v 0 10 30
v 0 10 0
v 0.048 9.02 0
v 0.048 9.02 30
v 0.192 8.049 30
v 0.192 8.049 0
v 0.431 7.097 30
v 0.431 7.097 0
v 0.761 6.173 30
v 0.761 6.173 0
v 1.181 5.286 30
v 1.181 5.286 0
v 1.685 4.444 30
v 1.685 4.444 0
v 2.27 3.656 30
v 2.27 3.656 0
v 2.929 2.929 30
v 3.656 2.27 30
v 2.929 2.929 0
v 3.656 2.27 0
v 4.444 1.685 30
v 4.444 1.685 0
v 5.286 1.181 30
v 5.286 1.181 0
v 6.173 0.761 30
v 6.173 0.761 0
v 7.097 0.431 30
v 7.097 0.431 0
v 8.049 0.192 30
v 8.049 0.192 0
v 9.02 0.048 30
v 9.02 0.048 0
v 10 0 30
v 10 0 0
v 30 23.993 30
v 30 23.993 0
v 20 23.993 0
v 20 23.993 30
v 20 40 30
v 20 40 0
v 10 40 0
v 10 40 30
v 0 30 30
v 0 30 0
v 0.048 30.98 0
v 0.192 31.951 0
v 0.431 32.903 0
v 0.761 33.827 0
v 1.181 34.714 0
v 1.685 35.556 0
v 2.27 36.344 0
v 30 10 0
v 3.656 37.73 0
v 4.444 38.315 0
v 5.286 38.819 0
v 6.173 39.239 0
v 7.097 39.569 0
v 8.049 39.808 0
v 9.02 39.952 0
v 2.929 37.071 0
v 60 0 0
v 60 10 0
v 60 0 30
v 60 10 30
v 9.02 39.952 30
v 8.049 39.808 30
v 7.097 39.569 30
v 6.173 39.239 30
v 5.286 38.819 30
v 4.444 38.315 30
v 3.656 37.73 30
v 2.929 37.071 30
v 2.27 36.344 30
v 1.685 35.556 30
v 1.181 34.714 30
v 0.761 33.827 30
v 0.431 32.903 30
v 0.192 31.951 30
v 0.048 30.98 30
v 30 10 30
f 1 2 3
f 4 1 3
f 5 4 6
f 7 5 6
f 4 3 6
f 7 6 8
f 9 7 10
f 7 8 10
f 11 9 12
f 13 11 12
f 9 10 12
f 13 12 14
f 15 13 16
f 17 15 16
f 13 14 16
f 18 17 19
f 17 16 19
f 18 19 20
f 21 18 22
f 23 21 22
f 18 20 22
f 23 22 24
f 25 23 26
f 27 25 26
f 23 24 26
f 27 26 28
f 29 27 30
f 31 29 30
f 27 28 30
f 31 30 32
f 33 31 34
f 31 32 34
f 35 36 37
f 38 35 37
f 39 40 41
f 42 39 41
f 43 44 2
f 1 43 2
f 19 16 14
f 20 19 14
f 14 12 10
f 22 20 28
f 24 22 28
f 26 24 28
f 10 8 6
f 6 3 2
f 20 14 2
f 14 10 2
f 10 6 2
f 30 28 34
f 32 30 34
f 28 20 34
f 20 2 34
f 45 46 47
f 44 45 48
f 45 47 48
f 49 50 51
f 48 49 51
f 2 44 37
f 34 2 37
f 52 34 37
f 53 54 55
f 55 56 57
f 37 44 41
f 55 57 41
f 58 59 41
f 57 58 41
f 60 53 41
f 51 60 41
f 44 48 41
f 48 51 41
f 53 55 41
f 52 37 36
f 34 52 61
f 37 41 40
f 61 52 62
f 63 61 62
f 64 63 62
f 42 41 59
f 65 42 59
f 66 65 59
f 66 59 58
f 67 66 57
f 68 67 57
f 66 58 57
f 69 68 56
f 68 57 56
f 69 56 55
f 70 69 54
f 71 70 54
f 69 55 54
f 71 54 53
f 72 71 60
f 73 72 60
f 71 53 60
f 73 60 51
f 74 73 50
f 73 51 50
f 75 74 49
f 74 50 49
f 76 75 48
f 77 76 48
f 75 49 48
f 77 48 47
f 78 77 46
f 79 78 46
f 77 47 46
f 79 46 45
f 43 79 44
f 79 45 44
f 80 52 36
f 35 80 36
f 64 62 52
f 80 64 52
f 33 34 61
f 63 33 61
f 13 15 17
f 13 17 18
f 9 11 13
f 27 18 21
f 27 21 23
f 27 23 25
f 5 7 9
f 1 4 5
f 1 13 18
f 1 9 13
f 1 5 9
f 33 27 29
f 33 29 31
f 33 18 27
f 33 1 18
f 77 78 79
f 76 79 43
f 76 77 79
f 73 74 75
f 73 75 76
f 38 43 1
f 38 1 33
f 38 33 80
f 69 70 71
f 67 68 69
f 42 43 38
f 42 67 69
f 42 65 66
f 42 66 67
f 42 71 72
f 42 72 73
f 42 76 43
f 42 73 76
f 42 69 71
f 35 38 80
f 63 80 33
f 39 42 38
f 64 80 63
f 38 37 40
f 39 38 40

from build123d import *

# Parameters (mm, degrees)
F1_DEPTH = 30


with BuildPart() as f1:
    # F0 (on Top) → F1 (new body)
    with BuildSketch(Plane.XY):
        with BuildLine():
            ThreePointArc((0, 10), (2.928932, 2.928932), (10, 0))
            Line((10, 0), (60, 0))
            Line((60, 0), (60, 10))
            Line((60, 10), (30, 10))
            Line((30, 10), (30, 23.99263))
            Line((30, 23.99263), (20, 23.99263))
            Line((20, 23.99263), (20, 40))
            Line((20, 40), (10, 40))
            ThreePointArc((10, 40), (2.928932, 37.071068), (0, 30))
            Line((0, 30), (0, 10))
        make_face()
    extrude(amount=F1_DEPTH)


solid = f1.part
